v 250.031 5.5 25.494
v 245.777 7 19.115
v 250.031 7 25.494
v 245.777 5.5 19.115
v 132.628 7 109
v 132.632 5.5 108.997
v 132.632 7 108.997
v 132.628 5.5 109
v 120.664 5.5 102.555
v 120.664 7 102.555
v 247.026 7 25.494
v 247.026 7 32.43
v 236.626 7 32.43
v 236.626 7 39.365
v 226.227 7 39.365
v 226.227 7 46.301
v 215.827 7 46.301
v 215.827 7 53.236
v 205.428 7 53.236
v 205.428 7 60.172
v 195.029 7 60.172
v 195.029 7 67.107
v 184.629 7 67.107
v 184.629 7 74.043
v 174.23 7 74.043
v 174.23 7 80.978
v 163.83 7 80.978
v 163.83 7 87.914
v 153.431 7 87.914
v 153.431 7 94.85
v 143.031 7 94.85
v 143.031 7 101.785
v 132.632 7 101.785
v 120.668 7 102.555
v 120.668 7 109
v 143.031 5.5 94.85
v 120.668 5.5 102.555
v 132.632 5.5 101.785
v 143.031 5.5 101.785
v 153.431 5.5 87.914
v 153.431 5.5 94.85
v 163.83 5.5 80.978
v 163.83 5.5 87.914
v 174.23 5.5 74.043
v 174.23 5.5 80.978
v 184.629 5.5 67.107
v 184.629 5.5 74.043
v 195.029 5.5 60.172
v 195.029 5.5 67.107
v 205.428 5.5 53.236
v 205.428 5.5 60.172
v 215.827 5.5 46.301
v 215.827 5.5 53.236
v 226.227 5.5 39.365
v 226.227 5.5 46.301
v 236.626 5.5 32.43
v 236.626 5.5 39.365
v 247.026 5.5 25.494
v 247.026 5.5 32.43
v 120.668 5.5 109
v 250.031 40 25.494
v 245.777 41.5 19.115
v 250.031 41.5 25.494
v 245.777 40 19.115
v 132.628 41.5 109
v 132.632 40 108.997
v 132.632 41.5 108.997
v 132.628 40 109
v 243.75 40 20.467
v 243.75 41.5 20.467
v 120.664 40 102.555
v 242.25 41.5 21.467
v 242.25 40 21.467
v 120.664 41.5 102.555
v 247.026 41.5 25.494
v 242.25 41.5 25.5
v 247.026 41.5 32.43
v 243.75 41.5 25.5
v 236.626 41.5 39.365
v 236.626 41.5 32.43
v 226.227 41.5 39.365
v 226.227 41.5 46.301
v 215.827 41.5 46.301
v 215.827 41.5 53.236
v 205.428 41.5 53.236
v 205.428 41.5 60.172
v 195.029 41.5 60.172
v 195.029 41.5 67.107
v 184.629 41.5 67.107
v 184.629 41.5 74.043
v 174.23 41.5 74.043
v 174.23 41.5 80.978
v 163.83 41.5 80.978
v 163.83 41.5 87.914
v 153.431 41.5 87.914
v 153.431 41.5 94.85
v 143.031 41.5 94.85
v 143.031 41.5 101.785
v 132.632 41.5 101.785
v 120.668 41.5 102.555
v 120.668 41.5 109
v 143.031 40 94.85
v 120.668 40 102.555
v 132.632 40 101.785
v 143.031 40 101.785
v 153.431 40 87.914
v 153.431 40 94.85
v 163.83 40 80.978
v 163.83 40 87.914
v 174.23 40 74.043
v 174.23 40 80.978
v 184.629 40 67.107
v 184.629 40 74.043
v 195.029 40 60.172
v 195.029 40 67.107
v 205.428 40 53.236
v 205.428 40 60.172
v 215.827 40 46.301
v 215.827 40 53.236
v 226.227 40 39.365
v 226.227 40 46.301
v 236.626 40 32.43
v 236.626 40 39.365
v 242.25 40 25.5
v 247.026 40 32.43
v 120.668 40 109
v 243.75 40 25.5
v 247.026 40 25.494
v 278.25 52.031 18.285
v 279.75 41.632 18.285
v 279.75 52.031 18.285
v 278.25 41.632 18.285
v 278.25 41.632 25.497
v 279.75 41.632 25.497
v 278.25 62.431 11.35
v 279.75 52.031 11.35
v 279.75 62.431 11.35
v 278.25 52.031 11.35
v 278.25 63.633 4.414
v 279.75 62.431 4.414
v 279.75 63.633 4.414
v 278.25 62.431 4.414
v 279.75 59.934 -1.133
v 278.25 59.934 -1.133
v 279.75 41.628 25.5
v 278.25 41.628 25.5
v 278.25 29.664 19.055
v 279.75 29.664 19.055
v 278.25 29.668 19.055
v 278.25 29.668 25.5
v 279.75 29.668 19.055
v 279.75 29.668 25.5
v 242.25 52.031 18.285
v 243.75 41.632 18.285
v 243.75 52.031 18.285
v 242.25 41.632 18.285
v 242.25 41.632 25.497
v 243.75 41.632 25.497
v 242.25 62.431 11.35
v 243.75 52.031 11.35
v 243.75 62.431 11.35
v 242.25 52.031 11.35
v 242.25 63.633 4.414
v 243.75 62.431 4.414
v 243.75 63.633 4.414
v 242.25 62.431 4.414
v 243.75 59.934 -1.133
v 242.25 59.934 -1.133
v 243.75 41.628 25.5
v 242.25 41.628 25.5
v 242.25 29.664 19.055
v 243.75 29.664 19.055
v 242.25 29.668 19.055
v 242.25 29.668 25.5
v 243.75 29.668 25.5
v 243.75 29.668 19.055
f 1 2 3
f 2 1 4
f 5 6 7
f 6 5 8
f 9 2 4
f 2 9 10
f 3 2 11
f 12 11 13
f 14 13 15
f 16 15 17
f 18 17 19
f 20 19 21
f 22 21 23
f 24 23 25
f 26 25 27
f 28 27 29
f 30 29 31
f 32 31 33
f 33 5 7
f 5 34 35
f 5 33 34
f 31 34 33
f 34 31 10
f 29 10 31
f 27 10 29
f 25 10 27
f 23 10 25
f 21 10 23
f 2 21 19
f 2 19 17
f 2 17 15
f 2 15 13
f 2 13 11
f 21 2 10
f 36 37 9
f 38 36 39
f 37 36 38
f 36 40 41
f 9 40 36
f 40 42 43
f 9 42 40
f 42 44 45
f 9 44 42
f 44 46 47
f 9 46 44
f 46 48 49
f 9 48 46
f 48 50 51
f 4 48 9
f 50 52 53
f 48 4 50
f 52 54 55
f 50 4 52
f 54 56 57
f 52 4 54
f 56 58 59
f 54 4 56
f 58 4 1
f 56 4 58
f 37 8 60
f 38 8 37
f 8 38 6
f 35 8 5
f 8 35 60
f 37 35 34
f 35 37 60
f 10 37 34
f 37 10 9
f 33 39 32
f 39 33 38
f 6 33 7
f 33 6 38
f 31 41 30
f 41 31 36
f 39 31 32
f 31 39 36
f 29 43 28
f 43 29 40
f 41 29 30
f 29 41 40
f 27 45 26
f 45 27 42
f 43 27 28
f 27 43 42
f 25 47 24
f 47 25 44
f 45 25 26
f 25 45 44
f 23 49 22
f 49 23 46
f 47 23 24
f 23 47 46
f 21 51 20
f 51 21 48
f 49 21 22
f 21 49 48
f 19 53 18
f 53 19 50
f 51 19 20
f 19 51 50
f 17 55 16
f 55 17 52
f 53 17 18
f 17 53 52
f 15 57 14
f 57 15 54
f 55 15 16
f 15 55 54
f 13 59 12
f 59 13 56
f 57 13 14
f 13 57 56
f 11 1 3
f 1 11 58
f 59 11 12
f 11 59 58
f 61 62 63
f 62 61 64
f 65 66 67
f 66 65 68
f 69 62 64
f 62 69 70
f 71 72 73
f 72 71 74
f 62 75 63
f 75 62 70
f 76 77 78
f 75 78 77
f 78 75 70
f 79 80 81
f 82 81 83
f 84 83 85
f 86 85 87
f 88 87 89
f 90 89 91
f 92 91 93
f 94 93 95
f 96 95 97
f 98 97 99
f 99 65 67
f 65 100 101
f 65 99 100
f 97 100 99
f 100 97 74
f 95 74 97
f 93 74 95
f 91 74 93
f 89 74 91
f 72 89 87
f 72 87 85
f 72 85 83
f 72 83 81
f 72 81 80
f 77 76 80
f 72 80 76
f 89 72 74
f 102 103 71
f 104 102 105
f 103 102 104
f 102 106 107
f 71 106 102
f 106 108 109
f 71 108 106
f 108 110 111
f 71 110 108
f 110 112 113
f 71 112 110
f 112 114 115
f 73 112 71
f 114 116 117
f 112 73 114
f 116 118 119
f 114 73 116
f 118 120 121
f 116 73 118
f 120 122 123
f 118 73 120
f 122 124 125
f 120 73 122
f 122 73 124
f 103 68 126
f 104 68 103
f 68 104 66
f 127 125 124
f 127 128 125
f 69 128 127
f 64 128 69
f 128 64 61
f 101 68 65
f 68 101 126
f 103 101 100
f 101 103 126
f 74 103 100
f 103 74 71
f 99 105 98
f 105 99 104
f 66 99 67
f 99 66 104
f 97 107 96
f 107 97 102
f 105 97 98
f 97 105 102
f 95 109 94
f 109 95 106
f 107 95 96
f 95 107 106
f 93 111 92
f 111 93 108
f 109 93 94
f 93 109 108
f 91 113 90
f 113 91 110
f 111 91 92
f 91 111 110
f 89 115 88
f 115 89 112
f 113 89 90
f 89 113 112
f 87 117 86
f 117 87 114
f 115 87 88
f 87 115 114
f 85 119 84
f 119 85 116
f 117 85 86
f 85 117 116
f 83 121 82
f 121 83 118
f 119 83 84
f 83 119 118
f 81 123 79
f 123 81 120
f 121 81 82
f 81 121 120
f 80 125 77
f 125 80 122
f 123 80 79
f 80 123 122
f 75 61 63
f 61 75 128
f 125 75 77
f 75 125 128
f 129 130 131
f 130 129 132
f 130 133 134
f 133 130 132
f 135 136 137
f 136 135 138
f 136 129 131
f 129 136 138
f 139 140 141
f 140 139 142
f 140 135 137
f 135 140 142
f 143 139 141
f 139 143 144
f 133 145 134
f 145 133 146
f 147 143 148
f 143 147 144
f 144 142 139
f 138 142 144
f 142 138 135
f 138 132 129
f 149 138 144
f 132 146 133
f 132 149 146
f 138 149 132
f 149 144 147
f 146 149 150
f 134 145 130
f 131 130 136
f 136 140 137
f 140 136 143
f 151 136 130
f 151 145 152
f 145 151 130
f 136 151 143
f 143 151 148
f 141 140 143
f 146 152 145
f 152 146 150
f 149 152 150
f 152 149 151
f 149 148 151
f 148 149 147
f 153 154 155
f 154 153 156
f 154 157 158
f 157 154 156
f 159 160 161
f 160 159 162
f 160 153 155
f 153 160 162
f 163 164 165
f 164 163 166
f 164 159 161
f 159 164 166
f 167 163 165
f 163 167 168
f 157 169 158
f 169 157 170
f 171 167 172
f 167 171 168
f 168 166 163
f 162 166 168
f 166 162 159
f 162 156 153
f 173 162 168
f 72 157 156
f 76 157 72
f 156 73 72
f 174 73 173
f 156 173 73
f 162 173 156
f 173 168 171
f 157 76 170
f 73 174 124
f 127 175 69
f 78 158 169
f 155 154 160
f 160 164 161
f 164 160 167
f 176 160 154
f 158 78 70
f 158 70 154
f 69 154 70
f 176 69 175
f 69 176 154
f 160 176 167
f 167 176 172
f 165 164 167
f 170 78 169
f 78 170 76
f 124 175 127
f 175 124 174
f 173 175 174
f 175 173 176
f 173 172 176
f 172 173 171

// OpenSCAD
// file: stair.scad
include <foundation.scad>

module stringer(run,steps) {
  tread_width = 10.5;
  tread_rise = 7;
  stringer_angle = 33.7;
  rotate([0,stringer_angle,0])
    difference(){
      difference(){
        difference(){
          cube([run,1.5,12]);
          translate([0,-3,0])
            rotate([0,-stringer_angle,0])
            cube([tread_width+12,6,tread_width+3]);
        }
        translate([-1,-2,0])
          rotate([0,90-stringer_angle,0])
          cube([tread_rise,6,tread_width]);
      }
      for(i = [1:1:steps])
        translate([22+(i-1)*12.5,-2,6])              
          rotate([0,-stringer_angle,0])
          union(){
          cube([tread_width,6,tread_width+3]);
          cube([tread_width,6,tread_rise]);
        }
    }
}
translate([ft(9.25),5.5,slab_thk+ft(8.75)])
stringer(ft(13.5),12);
translate([ft(9.25),5.5+ft(3)-1.5,slab_thk+ft(8.75)])
stringer(ft(13.5),12);


NE()
translate([-5.5,-5.5+ft(2)+1.5,ft(2)+1.5])
rotate([0,0,90])
stringer(ft(4),3);

NE()
translate([-5.5-ft(3),-5.5+ft(2)+1.5,ft(2)+1.5])
rotate([0,0,90])
stringer(ft(4),3);
// file: TJI.scad
include <foundation.scad>


HORIZONTAL_NORTH=0;
HORIZONTAL_WEST=1;
VERTICAL_NORTH=2;
VERTICAL_WEST=3;

module tji_rim_board(length,orientation){

  w=1.5;
  h=11+7/8;
  
  if( orientation == HORIZONTAL_NORTH ){
    translate([0,0,slab_thk])
      versa_lam()
      cube([length,w,h]);
  }
  if( orientation == HORIZONTAL_WEST ){
    translate([w,0,slab_thk])
      rotate([0,0,90])
      versa_lam()
      cube([length,w,h]);
  }
  if( orientation == VERTICAL_NORTH ){
    translate([0,0,slab_thk+thk])
      rotate([0,-90,0])
      versa_lam()
        cube([length,w,h]);
  }
  if( orientation == VERTICAL_WEST ){
    translate([0,0,slab_thk])
      rotate([0,-90,-90])
      versa_lam()
        cube([length,w,h]);
  }
  
}


module TJI_230(length, orientation){
  web=3/8;
  height=11+7/8;
 
  w=2+5/16;
  h=1+3/8;
  
  if( orientation == HORIZONTAL_NORTH ){
    translate([0,0,slab_thk])
    union(){
      cube([length,w,h]);
      translate([0,w/2,0])
        cube([length,web,height]);
      translate([0,0,height-h])
        cube([length,w,h]);
    }
  }
  if( orientation == HORIZONTAL_WEST ){
      translate([w,0,slab_thk])
        rotate([0,0,90])
    union(){
      cube([length,w,h]);
      translate([0,w/2,0])
        cube([length,web,height]);
      translate([0,0,height-h])
        cube([length,w,h]);
    }
  }
}

module TJI_560(length, orientation){
  web=3/8;
  height=11+7/8;
 
  w=2+5/16;
  h=1+3/8;

  if( orientation == HORIZONTAL_NORTH ){
    translate([0,0,slab_thk])
    union(){
      cube([length,w,h]);
      translate([0,w/2,0])
        cube([length,web,height]);
      translate([0,0,height-h])
        cube([length,w,h]);
    }
  }
  if( orientation == HORIZONTAL_WEST ){
      translate([w,0,slab_thk])
        rotate([0,0,90])
    union(){
      cube([length,w,h]);
      translate([0,w/2,0])
        cube([length,web,height]);
      translate([0,0,height-h])
        cube([length,w,h]);
    }
  }
}
// main file
include <foundation.scad>
include <TJI.scad>
include <stair.scad>

HORIZONTAL_NORTH=0;
HORIZONTAL_WEST=1;
VERTICAL_NORTH=2;
VERTICAL_WEST=3;
main_roof_pitch=7.8;
guest_roof_pitch=main_roof_pitch / 2;
porch_roof_pitch=3.58;


module versa_lam(){
   color([.5,.2,0]) children();
}
module doug_fir(){
  color([.75,.57,0]) children();
}
module ptdf_sill(){
  color([0,.57,0]) children();
}

module post(w,h,l,orientation){
  echo("{name='POST'",",w=",w,",h=",h,",length=",l/12,"type='post'}");
  if( orientation == HORIZONTAL_NORTH ){
    translate([0,0,slab_thk])
      cube([l,h,w]);
  }
  if( orientation == HORIZONTAL_WEST ){
    translate([h,0,slab_thk])
      rotate([0,0,90])
      cube([l,h,w]);
  }
  if( orientation == VERTICAL_NORTH ){
    translate([1.5,0,slab_thk])
      rotate([0,-90,0])
      cube([l,h,w]);
  }
  
}


module guest_roof_joist(length,orientation){
  width=1.5;
  thk=11.5;
  echo("{name='2x12'",",w=",thk,",h=",width,",length=",length/12,"type='board'}");
   echo("{name='Simpson HUS212-2', type='bracket', qty=1}");
   echo("{name='Simpson H3', type='bracket', qty=1}");
  if( orientation == HORIZONTAL_NORTH ){
    translate([0,0,slab_thk])
      doug_fir()
      cube([length,width,thk]);
  }
  if( orientation == HORIZONTAL_WEST ){
    translate([5.5,5.5,slab_thk])
      rotate([0,0,90])
      doug_fir()
      cube([length,width,thk]);
  }
  if( orientation == VERTICAL_NORTH ){
    translate([1.5,0,slab_thk+thk])
      rotate([0,-90,0])
      doug_fir()
        cube([length,width,thk]);
  }
  if( orientation == VERTICAL_WEST ){
    translate([0,0,slab_thk+thk])
      rotate([0,-90,-90])
      doug_fir()
        cube([length,width,thk]);
  }
  
}
module porch_roof_joist(length,orientation){
  width=1.5;
  thk=7.5;
  echo("{name='2x8'",",w=",thk,",h=",width,",length=",length/12,"type='board'}");
  if( orientation == HORIZONTAL_NORTH ){
    translate([0,0,slab_thk])
      doug_fir()
      cube([length,width,thk]);
  }
  if( orientation == HORIZONTAL_WEST ){
    translate([5.5,5.5,slab_thk])
      rotate([0,0,90])
      doug_fir()
      cube([length,width,thk]);
  }
  if( orientation == VERTICAL_NORTH ){
    translate([1.5,0,slab_thk+thk])
      rotate([0,-90,0])
      doug_fir()
        cube([length,width,thk]);
  }
  if( orientation == VERTICAL_WEST ){
    translate([0,0,slab_thk+thk])
      rotate([0,-90,-90])
      doug_fir()
        cube([length,width,thk]);
  }
  
}
/*
module garage_roof_joist(length,orientation){
  width=1.5;
  thk=7.5;
  echo("{name='2x8'",",w=",thk,",h=",width,",length=",length/12,"type='board'}");
  if( orientation == HORIZONTAL_NORTH ){
    translate([0,0,slab_thk])
      doug_fir()
      cube([length,width,thk]);
  }
  if( orientation == HORIZONTAL_WEST ){
    translate([5.5,5.5,slab_thk])
      rotate([0,0,90])
      doug_fir()
      cube([length,width,thk]);
  }
  if( orientation == VERTICAL_NORTH ){
    translate([1.5,0,slab_thk+thk])
      rotate([0,-90,0])
      doug_fir()
        cube([length,width,thk]);
  }
  if( orientation == VERTICAL_WEST ){
    translate([0,0,slab_thk+thk])
      rotate([0,-90,-90])
      doug_fir()
        cube([length,width,thk]);
  }
  
}

*/
module exterior_stud(length,orientation){
  width=5.5;
  thk=1.5;
  echo("{name='2x6'",",w=",thk,",h=",width,",length=",length/12,",type='board'}");
  if( orientation == HORIZONTAL_NORTH ){
    translate([0,0,slab_thk])
      cube([length,width,thk]);
  }
  if( orientation == HORIZONTAL_WEST ){
    translate([5.5,5.5,slab_thk])
      rotate([0,0,90])
      cube([length,width,thk]);
  }
  if( orientation == VERTICAL_NORTH ){
    translate([1.5,0,slab_thk+thk])
      rotate([0,-90,0])
        cube([length,width,thk]);
  }
  if( orientation == VERTICAL_WEST ){
    translate([0,0,slab_thk+thk])
      rotate([0,-90,-90])
        cube([length,width,thk]);
  }
  
}
module interior_stud(length,orientation){
  width=3.5;
  thk=1.5;
  echo("{name='2x4'",",w=",thk,",h=",width,",length=",length/12,"type='board'}");
  if( orientation == HORIZONTAL_NORTH ){
    translate([0,0,slab_thk])
      cube([length,width,thk]);
  }
  if( orientation == HORIZONTAL_WEST ){
    translate([width,0,slab_thk])
      rotate([0,0,90])
      cube([length,width,thk]);
  }
  if( orientation == VERTICAL_NORTH ){
    translate([1.5,0,slab_thk+thk])
      rotate([0,-90,0])
        cube([length,width,thk]);
  }
  if( orientation == VERTICAL_WEST ){
    translate([0,0,slab_thk])
      rotate([0,-90,-90])
        cube([length,width,thk]);
  }
  
}

module east_top_plate(){
   translate([0,0,ft(8)-1.5])
     doug_fir()
    exterior_stud(ft(10),HORIZONTAL_NORTH);
   translate([0,0,ft(8)-3])
     doug_fir()
    exterior_stud(ft(10),HORIZONTAL_NORTH);

}

module west_top_plate(){
  translate([0,ft(18)-5.5,ft(8)-1.5])
    doug_fir()
    exterior_stud(ft(12),HORIZONTAL_NORTH);
    translate([0,ft(18)-5.5,ft(8)-3])
      doug_fir()
    exterior_stud(ft(12),HORIZONTAL_NORTH);

}
module south_top_plate(){
  translate([0,0,ft(8)-3])
    doug_fir()
    exterior_stud(ft(12)-5,HORIZONTAL_WEST);
  translate([0,ft(12)-5,ft(8)-3])
    doug_fir()
    exterior_stud(ft(6)-5,HORIZONTAL_WEST);

  translate([0,0,ft(8)-1.5])
    doug_fir()
    exterior_stud(ft(6)-5,HORIZONTAL_WEST);
  translate([0,ft(6)-5,ft(8)-1.5])
    doug_fir()
    exterior_stud(ft(12)-5,HORIZONTAL_WEST);

}

module east_bottom_plate() {
  echo("{toggle=TREATED_MCA/GREEN}");
  exterior_stud(ft(12),HORIZONTAL_NORTH);
  translate([ft(12),0,0])
    exterior_stud(ft(12)-2.75,HORIZONTAL_NORTH);
  echo("{toggle='NOT_TREATED_MCA/GREEN'}");
}
module south_bottom_plate() {
  echo("{toggle='TREATED_MCA/GREEN'}");
  exterior_stud(ft(12),HORIZONTAL_WEST);
  translate([0,ft(12),0])
    exterior_stud(ft(6)+0.25-5.5,HORIZONTAL_WEST);
  echo("{toggle='NOT_TREATED_MCA/GREEN'}");
}

module roof_diff(){
   translate([5,-ft(5),ft(17.5)])
    rotate([0,main_roof_pitch,0])
    translate([-8,0,0])
     cube([ft(40),ft(45),ft(4)]);
}
module garage_roof_diff(){
  SW()
    translate([-2,-3,ft(11)+4])
    rotate([-guest_roof_pitch,0,0])
    cube([ft(32),ft(12),ft(3)]);
}

module north_wall() {
  NE()
  for( i = [0:16:16*12] ){
    translate([-5.5,i+5.5,0])
      exterior_stud(ft(14)-1.5,VERTICAL_WEST);
  }
  NE()
  translate([-5.5,ft(18)-5.5,0])
    exterior_stud(ft(14)-1.5,VERTICAL_WEST);
}
module north_bottom_plate() {

  translate([slab_north-5.5,0,0])
    doug_fir()
    south_bottom_plate();
}
module west_bottom_plate() {
  echo("{toggle='TREATED_MCA/GREEN'}");
  translate([0,slab_west-5.5,0])
    doug_fir()    
    east_bottom_plate();
  /* counter pony wall plate */
  SW()
    ptdf_sill()    
    //translate([ft(14.75),ft(-10)-5.5,0])
    translate([ft(14.75)-2.5/2,ft(-10),0])
    interior_stud(ft(10)-5.5,HORIZONTAL_WEST);
  echo("{toggle='NOT_TREATED_MCA/GREEN'}");
}
module east_west_north_wall(){
    NE()
      union(){
      versa_lam(){
        echo("{toggle='VERSA_STUD_1.7_2400}");
      for( i = [0:16:16*10] ){
        translate([-i-1.5,0,0])
          exterior_stud(ft(14)-1.5+sin(main_roof_pitch)*i,VERTICAL_NORTH);
      }
      SW(){
        translate([0,-5.5,0])
          for( i = [0:16:16*8] ){
            translate([-i-1.5,0,0])
              exterior_stud(ft(14)-1.5+sin(main_roof_pitch)*i,VERTICAL_NORTH);
          }
      }
    }
      echo("{toggle='NOT_VERSA_STUD'}");
  }
    union(){
      NE()
        translate([-ft(14)+2.5,0,0])
        versa_lam()
        echo("{toggle='VERSA_STUD_1.7_2400}");
        exterior_stud(ft(15)+9,VERTICAL_NORTH);
      NW()
        translate([-ft(12)+2.5,-5.5,0])
        versa_lam()
        echo("{toggle='NOT_VERSA_STUD'}");
        exterior_stud(ft(15)+5,VERTICAL_NORTH);
    }
    echo("{toggle='NOT_VERSA_STUD'}");

  east_top_plate();
  west_top_plate();
  south_top_plate();

  versa_lam()
    echo("{toggle='VERSA_STUD_1.7_2400}");
    north_wall();
    echo("{toggle='NOT_VERSA_STUD'}");
}

module living_room_framing(){
  SE()
    /* main upper floor glue lam */
    echo("{toggle='GLUE_LAM'}");
    translate([ft(12)-5.5,ft(3)+5.5,ft(8)])
    versa_lam()
    post(12,5.125,ft(15)-5.5,HORIZONTAL_WEST);
  translate([ft(10)-5.5,0,ft(8)])
    versa_lam()
    post(12,5.125,ft(3.5),HORIZONTAL_WEST);

  echo("{toggle='NOT_GLUE_LAM'}");
  SE()
    for( i = [0:16:16*13] ){
      translate([0,i,0])
        doug_fir()
      exterior_stud(ft(8)-4.5,VERTICAL_WEST);
    }
  union() {
  SE()
    translate([ft(9)+6.5,0,0])
    translate([5.5-1.5,0,1.5])
    doug_fir()
    post(5.5,5.5,ft(8)-1.5,VERTICAL_NORTH);
  
  SE()
    for( i = [0:16:16*6] ){
      translate([5.5+i,0,0])
        doug_fir()
      exterior_stud(ft(8)-4.5,VERTICAL_NORTH);
    }
  }
  SW()
  union() {
    translate([ft(12)-7.325,0,0])
    translate([5.5,-5.5,1.5])
      doug_fir()
    post(3.5,5.5,ft(8)-1.5,VERTICAL_NORTH);
  SE()
    for( i = [0:16:16*8] ){
      translate([i,-5.5,0])
        doug_fir()
    exterior_stud(ft(8)-4.5,VERTICAL_NORTH);
    }
  }
}

module upper_floor(){
  SE()
    for( i = [0:16:16*1] ){
    translate([1.5,i+5.5,ft(8)])
      versa_lam()
      echo("{name='Simpson ITS2.37/11.88 Top Flange Hanger', type='bracket', qty=1}")
      TJI_230(ft(10)-7, HORIZONTAL_NORTH);
    }
  SE()
    for( i = [0:16:16*9] ){
    translate([1.5,i+42,ft(8)])
      versa_lam()
      echo("{name='Simpson ITS2.37/11.88 Top Flange Hanger', type='bracket', qty=1}")
      TJI_230(ft(12)-7, HORIZONTAL_NORTH);
    }
  translate([1.5,ft(17)-6,ft(8)])
    versa_lam()
      TJI_230(ft(12)-7, HORIZONTAL_NORTH);

  SE()
    translate([0,0,ft(8)])
    tji_rim_board(ft(18),HORIZONTAL_WEST);

  SE()
    translate([0,0,ft(8)])
    tji_rim_board(ft(10),HORIZONTAL_NORTH);

  SW()
    translate([0,-1.5,ft(8)])
    tji_rim_board(ft(12),HORIZONTAL_NORTH);

}

module bed_room_framing(){
  
  difference(){
    SE()
    for( i = [0:16:16*13] ){
      translate([0,i,ft(8)+11+7/8])
        doug_fir()
        exterior_stud(ft(10)-4.5,VERTICAL_WEST);
    }
    roof_diff();
  }
  doug_fir(){
  translate([0,-5.5,ft(8)+11+7/8])
    exterior_stud(ft(12),HORIZONTAL_WEST);
  translate([0,ft(12)-5.5,ft(8)+11+7/8])
    exterior_stud(ft(6)+0.25-5.5,HORIZONTAL_WEST);
  translate([5.0,0,ft(8)+11+7/8])
    exterior_stud(ft(10)+0.25-5.5,HORIZONTAL_NORTH);
  SW()
  translate([0,-5.5,ft(8)+11+7/8])
    exterior_stud(ft(12),HORIZONTAL_NORTH);
  }

  difference(){
    SW()
      for( i = [0:16:16*8] ){
        translate([i,-5.5,ft(8)+11+7/8])
          doug_fir()
          exterior_stud(ft(10)-4.5,VERTICAL_NORTH);
    }
    roof_diff();
  }
  difference(){
    SE()
      for( i = [0:16:16*7] ){
        translate([i,0,ft(8)+11+7/8])
          doug_fir()
          exterior_stud(ft(10)-4.5,VERTICAL_NORTH);
    }
    roof_diff();
  }
}
module guest_room_framing(){
  // Bottom plates
  SW()
    translate([0,-5.5,0])
    ptdf_sill()
    echo("{toggle='TREATED_MCA/GREEN'}");
    exterior_stud(ft(10)+1.75,HORIZONTAL_WEST);
  SW()
    translate([5.5,ft(10)+1.75-5.5,0])
    ptdf_sill()    
    exterior_stud(ft(8)+3.75,HORIZONTAL_NORTH);
  SW()
    translate([ft(9)-8.25,-5.5,0])
    ptdf_sill()    
    exterior_stud(ft(10)-3.5,HORIZONTAL_WEST);
  echo("{toggle='NOT_TREATED_MCA/GREEN'}");
  difference(){
    union(){
      SW()
        for( i = [0:16:16*7] ){
          translate([0,i,0])
            doug_fir()
            exterior_stud(ft(12)-4.5,VERTICAL_WEST);
        }
      SW()
        for( i = [0:16:16*6] ){
          translate([i,ft(10)-3.75,0])
            doug_fir()
            exterior_stud(ft(12)-4.5,VERTICAL_NORTH);
        }
      SW()
        for( i = [0:16:16*7] ){
          translate([ft(9)-8.25,i,0])
            doug_fir()
            exterior_stud(ft(12)-4.5,VERTICAL_WEST);
        }
      SW()
        translate([ft(9)-4.25,ft(10)-3.75,0])
        doug_fir()
        exterior_stud(ft(12)-4.5,VERTICAL_NORTH);
      
    }
    garage_roof_diff();
  }
}
module upper_sills(){
  // NORTH Wall
  delta=3;
  n_wall=14;
  NE()
    translate([-5.5,-5.5,ft(n_wall)])
    doug_fir()
    exterior_stud(ft(12)+5.5,HORIZONTAL_WEST);
  NE()
    translate([-5.5,ft(12),ft(n_wall)])
    doug_fir()
    exterior_stud(ft(5)+7,HORIZONTAL_WEST);
  NE()
    translate([-5.5,-5.5,ft(n_wall)+1.5])
    doug_fir()
    exterior_stud(ft(12)+7,HORIZONTAL_WEST);
  NE()
     translate([-5.5,ft(12),ft(n_wall)+1.5])
    doug_fir()
     exterior_stud(ft(5)+7,HORIZONTAL_WEST);

   // SOUTH Wall
   wall=17.4;
   SE()
    translate([0,-5.5,ft(wall)-delta])
    doug_fir()
     exterior_stud(ft(12)+5.5,HORIZONTAL_WEST);
   SE()
     translate([0,ft(12),ft(wall)-delta])
     doug_fir()
     exterior_stud(ft(5)+7,HORIZONTAL_WEST);
   SE()
     translate([0,-5.5,ft(wall)-delta+1.5])
     doug_fir()
     exterior_stud(ft(12)+7,HORIZONTAL_WEST);
   SE()
     translate([0,ft(12),ft(wall)-delta+1.5])
     doug_fir()
     exterior_stud(ft(5)+7,HORIZONTAL_WEST);
   // East West Wall
   rotate([0,main_roof_pitch,0]){
   SE()
     translate([-ft(2.1),0,ft(wall)-delta-1])
     doug_fir()
     exterior_stud(ft(12),HORIZONTAL_NORTH);
   SE()
     translate([ft(12)-ft(1.7),0,ft(wall)-delta-1])
     doug_fir()
     exterior_stud(ft(11),HORIZONTAL_NORTH);
   }
   rotate([0,main_roof_pitch,0]){
   SE()
     translate([-ft(2.1),0,ft(wall)-2.5])
     doug_fir()
     exterior_stud(ft(12)+5.5,HORIZONTAL_NORTH);
   SE()
     translate([ft(12)-ft(1.7),0,ft(wall)-2.5])
     doug_fir()
     exterior_stud(ft(11),HORIZONTAL_NORTH);
   }
   // West
   rotate([0,main_roof_pitch,0]){
   SW()
     translate([-ft(2.1),-5.5,ft(wall)-delta-1])
     doug_fir()
     exterior_stud(ft(12)+5.5,HORIZONTAL_NORTH);
   SW()
     translate([ft(12)-ft(1.7),-5.5,ft(wall)-delta-1])
     doug_fir()
     exterior_stud(ft(11),HORIZONTAL_NORTH);
   }
   rotate([0,main_roof_pitch,0]){
   SW()
     translate([-ft(2.1),-5.5,ft(wall)-2.5])
     doug_fir()
     exterior_stud(ft(12)+5.5,HORIZONTAL_NORTH);
   SW()
     translate([ft(12)-ft(1.7),-5.5,ft(wall)-2.5])
     doug_fir()
     exterior_stud(ft(11),HORIZONTAL_NORTH);
   }
   // Guest
   translate([0,-5.25,ft(12.3)])
     rotate([-guest_roof_pitch,0,0])
     union(){
     doug_fir()
     union(){
       SW()
         exterior_stud(ft(10)-3,HORIZONTAL_WEST);
       SW()
         translate([ft(8.325)-0.25,0,0])
         exterior_stud(ft(10.185),HORIZONTAL_WEST);
       SW()
         translate([0,ft(10)+2,0])
         exterior_stud(ft(8.75)-5.5,HORIZONTAL_NORTH);
     }
     doug_fir()
     union(){
       SW()
         translate([0,0,1.5])
         exterior_stud(ft(10)-3,HORIZONTAL_WEST);
       SW()
         translate([ft(8.325)-0.25,0,1.5])
         exterior_stud(ft(10)-3.75,HORIZONTAL_WEST);
       SW()
         translate([0,ft(10)+2,1.5])
         exterior_stud(ft(8.75),HORIZONTAL_NORTH);
     }
   }
}
module garage_roof(){
  // Ledger
  base_of_ledger=ft(12)-9.325;
  SW()
    translate([0,0,base_of_ledger])
    guest_roof_joist(ft(12),HORIZONTAL_NORTH);
  SW()
    translate([ft(12),0,base_of_ledger])
    guest_roof_joist(ft(12),HORIZONTAL_NORTH);
  SW()
    translate([ft(24),0,base_of_ledger])
    guest_roof_joist(ft(5),HORIZONTAL_NORTH);

  echo("{toggle='GLUE_LAM'}");
  SW()
    translate([ft(9),ft(10)-3.125,ft(10.5)-8.5])
    versa_lam()
    post(9.75,5+1/2,ft(8)+ft(1),HORIZONTAL_NORTH);
  SW()
    translate([ft(18),ft(10)-3.125,ft(10.5)-8.5])
    versa_lam()
    post(9.75,5+1/2,ft(10)+ft(1),HORIZONTAL_NORTH);
  echo("{toggle='NOT_GLUE_LAM'}");
  SW()
    for( i = [0:24:24*13] ){
      translate([i+6.2,-5,base_of_ledger+.75])
        doug_fir()
        rotate([-guest_roof_pitch,0,0])
        guest_roof_joist(ft(13),HORIZONTAL_WEST);
    }
  SW()
    doug_fir()
    translate([ft(18)+1,ft(10)+1.75-5.5,-3])
    post(5.5,5.5,ft(10)+1,VERTICAL_NORTH);
  SW()
    doug_fir()
    translate([ft(27)+6.5,ft(10)+1.75-5.5,-3])
    post(5.5,5.5,ft(10)+1,VERTICAL_NORTH);
  SW()
    doug_fir()
    translate([ft(27)+6.5,0-5.5,-3])
    post(5.5,5.5,ft(12)-6,VERTICAL_NORTH);
  echo("{toggle='GLUE_LAM'}");
  NW()
    versa_lam()
    translate([0,-5.5,ft(11)+3])
    post(9.75,5+1/2,ft(4)+ft(1),HORIZONTAL_NORTH);
  echo("{toggle='NOT_GLUE_LAM'}");
}
module main_roof(){
  SE()
  for( i = [0:24:24*8] ){
    versa_lam()
      translate([-24.2,i+10,ft(18)-3])
      rotate([0,main_roof_pitch,0])
        TJI_560(ft(28),HORIZONTAL_NORTH);
    echo("{name='Simpson H8', type='bracket', qty=2}");
  }
  // Extra for soffets
  EXTRA()
    %TJI_560(ft(28),HORIZONTAL_NORTH);
  for( i = [0:1:14] ){
    echo("{name='Simpson H3', type='bracket', qty=1}");
  }
}
module back_porch_roof(){
  base_of_porch_ledger=ft(9.0)+2.5;
  // Posts
  SE()
    doug_fir()
    translate([-ft(6)+2.5,0,0])
    post(5.5,5.5,ft(8.5)+4.5,VERTICAL_NORTH);
   SE()
    doug_fir()
     translate([-ft(6)+2.5,ft(18)-5.5,0])
     post(5.5,5.5,ft(8.5)+4.5,VERTICAL_NORTH);
  // Beam
   echo("{toggle='GLUE_LAM'}");
   SE()
     versa_lam()
     translate([-ft(6)-1.5,0,ft(8)+7.5])
     post(9.75,5.5,ft(18)+1.1,HORIZONTAL_WEST);
   echo("{toggle='NOT_GLUE_LAM'}");
  // Ledger
  SE()
    translate([-5.5,-5.5,base_of_porch_ledger])
    doug_fir()
    porch_roof_joist(ft(12),HORIZONTAL_WEST);
  translate([-5.5,ft(12)-5.5,base_of_porch_ledger])
    doug_fir()
    porch_roof_joist(ft(6)+1.5,HORIZONTAL_WEST);

  SE()
    for( i = [0:24:24*9] ){
      echo("{name='Simpson HUC26 2x', type='bracket', qty=2}");
      rotate([0,-porch_roof_pitch,0])
      translate([-ft(5)-2,i,base_of_porch_ledger])
        porch_roof_joist(ft(6)-4,HORIZONTAL_NORTH);
  }
}
module front_porch_roof(){
  base_of_porch_ledger=ft(7);
  // Posts
  NE()
    doug_fir()
    translate([ft(6),ft(4)+6.5,0])
    post(5.5,5.5,base_of_porch_ledger+9,VERTICAL_NORTH);
  NE()
    doug_fir()
     translate([ft(6),ft(10)-3,0])
     post(5.5,5.5,base_of_porch_ledger+9,VERTICAL_NORTH);
  // Beam
  echo("{toggle='GLUE_LAM'}");
   NE()
     versa_lam()
     translate([ft(6)-4,ft(4)+6.5,base_of_porch_ledger+9])
     post(9.75,5.5,ft(6)-4,HORIZONTAL_WEST);
   echo("{toggle='NOT_GLUE_LAM'}");
  // Ledger
   NE()
     translate([-4,ft(4),base_of_porch_ledger+ft(1)+4])
     doug_fir()
     porch_roof_joist(ft(6)-4,HORIZONTAL_WEST);
   translate([0,0,base_of_porch_ledger+ft(1)+4])
   union() {
     NE()
       for( i = [0:24:24*2] ){
         rotate([0,guest_roof_pitch,0])
           translate([-1,i+ft(4)+5.5,0])
           doug_fir()
           porch_roof_joist(ft(6)-3,HORIZONTAL_NORTH);
       }
     NE()
       rotate([0,guest_roof_pitch,0])
       translate([-1,ft(10)+1,0])
       porch_roof_joist(ft(6)-3,HORIZONTAL_NORTH);
   }
}
module bottom_plate(){
  ptdf_sill() {
  north_bottom_plate();
  east_bottom_plate();
  south_bottom_plate();
  west_bottom_plate();
  }
}
